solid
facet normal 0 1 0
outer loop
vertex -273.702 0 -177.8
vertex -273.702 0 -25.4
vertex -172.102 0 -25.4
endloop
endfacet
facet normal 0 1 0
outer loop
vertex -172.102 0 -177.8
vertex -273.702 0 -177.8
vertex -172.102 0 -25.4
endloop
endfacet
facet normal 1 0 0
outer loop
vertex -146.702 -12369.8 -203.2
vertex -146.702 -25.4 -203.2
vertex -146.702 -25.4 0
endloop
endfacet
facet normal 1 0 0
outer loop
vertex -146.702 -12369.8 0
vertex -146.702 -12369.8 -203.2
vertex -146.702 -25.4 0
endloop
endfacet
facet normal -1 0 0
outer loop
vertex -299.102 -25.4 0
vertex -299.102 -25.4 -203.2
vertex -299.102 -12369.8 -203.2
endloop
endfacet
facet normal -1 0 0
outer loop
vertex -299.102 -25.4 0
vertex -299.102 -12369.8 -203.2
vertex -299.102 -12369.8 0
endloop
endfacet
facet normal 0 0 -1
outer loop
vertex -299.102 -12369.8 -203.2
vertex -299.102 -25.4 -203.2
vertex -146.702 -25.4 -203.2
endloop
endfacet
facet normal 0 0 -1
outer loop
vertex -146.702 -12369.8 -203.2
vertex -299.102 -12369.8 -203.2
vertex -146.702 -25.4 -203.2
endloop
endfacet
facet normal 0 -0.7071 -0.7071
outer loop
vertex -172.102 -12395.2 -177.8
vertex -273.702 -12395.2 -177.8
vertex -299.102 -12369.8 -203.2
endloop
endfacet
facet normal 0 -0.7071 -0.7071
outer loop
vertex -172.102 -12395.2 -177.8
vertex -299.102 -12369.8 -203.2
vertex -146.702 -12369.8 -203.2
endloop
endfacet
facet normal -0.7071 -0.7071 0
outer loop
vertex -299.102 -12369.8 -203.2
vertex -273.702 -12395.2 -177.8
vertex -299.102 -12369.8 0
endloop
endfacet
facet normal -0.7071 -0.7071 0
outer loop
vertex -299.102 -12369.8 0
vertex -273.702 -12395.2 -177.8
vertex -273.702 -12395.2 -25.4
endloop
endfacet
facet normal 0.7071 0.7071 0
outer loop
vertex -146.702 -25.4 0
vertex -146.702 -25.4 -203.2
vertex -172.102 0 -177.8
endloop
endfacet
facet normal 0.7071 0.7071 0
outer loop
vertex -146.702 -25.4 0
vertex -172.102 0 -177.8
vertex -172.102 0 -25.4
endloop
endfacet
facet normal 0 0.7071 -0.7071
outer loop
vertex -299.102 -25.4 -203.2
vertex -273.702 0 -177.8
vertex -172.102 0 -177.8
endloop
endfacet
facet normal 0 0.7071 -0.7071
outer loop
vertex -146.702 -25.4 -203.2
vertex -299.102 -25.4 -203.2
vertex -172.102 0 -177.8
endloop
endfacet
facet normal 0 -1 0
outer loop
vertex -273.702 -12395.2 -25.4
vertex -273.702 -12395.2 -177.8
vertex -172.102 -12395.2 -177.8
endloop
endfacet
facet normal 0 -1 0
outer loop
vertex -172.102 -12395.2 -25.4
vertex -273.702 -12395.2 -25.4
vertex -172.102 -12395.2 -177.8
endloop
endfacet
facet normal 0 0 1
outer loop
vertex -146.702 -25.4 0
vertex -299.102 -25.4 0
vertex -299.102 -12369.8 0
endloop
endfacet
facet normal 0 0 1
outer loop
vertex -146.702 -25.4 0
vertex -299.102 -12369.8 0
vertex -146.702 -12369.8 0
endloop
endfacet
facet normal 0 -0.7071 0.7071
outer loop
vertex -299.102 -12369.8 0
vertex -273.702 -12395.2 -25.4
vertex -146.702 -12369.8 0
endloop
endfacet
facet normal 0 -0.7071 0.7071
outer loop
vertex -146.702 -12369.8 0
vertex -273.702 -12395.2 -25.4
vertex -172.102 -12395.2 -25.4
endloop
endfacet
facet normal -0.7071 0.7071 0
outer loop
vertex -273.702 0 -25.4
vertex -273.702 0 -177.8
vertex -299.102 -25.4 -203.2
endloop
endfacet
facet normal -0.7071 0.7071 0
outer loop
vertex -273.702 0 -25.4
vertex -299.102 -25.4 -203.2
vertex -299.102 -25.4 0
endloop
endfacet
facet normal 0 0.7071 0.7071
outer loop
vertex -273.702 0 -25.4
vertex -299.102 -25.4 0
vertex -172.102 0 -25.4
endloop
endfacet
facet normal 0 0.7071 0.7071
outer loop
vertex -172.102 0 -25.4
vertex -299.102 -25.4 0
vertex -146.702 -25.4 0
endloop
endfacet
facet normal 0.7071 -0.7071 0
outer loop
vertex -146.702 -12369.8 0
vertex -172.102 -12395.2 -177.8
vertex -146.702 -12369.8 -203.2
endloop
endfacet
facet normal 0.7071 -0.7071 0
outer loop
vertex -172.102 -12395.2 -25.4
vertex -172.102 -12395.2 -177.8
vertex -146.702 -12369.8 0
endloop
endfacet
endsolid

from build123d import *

# Parameters (mm, degrees)
F0_W     = 152.4
F0_H     = 203.2
F1_DEPTH = 12395.2
F2_SIZE  = 25.4
F3_SIZE  = 25.4


with BuildPart() as f1:
    # F0 (on Front) → F1 (new body)
    with BuildSketch(Plane.XZ):
        with Locations((-222.902071, -101.6)):
            Rectangle(F0_W, F0_H)
    extrude(amount=F1_DEPTH)

    # F2
    f2_edges = [f1.edges().sort_by_distance(p)[0] for p in [
        (-146.702071, -12395.2, -101.6),
        (-222.902071, -12395.2, 0),
        (-299.102071, -12395.2, -101.6),
        (-222.902071, -12395.2, -203.2),
    ]]
    chamfer(f2_edges, length=F2_SIZE)

    # F3
    f3_edges = [f1.edges().sort_by_distance(p)[0] for p in [
        (-222.902071, 0, 0),
        (-146.702071, 0, -101.6),
        (-222.902071, 0, -203.2),
        (-299.102071, 0, -101.6),
    ]]
    chamfer(f3_edges, length=F3_SIZE)


solid = f1.part
